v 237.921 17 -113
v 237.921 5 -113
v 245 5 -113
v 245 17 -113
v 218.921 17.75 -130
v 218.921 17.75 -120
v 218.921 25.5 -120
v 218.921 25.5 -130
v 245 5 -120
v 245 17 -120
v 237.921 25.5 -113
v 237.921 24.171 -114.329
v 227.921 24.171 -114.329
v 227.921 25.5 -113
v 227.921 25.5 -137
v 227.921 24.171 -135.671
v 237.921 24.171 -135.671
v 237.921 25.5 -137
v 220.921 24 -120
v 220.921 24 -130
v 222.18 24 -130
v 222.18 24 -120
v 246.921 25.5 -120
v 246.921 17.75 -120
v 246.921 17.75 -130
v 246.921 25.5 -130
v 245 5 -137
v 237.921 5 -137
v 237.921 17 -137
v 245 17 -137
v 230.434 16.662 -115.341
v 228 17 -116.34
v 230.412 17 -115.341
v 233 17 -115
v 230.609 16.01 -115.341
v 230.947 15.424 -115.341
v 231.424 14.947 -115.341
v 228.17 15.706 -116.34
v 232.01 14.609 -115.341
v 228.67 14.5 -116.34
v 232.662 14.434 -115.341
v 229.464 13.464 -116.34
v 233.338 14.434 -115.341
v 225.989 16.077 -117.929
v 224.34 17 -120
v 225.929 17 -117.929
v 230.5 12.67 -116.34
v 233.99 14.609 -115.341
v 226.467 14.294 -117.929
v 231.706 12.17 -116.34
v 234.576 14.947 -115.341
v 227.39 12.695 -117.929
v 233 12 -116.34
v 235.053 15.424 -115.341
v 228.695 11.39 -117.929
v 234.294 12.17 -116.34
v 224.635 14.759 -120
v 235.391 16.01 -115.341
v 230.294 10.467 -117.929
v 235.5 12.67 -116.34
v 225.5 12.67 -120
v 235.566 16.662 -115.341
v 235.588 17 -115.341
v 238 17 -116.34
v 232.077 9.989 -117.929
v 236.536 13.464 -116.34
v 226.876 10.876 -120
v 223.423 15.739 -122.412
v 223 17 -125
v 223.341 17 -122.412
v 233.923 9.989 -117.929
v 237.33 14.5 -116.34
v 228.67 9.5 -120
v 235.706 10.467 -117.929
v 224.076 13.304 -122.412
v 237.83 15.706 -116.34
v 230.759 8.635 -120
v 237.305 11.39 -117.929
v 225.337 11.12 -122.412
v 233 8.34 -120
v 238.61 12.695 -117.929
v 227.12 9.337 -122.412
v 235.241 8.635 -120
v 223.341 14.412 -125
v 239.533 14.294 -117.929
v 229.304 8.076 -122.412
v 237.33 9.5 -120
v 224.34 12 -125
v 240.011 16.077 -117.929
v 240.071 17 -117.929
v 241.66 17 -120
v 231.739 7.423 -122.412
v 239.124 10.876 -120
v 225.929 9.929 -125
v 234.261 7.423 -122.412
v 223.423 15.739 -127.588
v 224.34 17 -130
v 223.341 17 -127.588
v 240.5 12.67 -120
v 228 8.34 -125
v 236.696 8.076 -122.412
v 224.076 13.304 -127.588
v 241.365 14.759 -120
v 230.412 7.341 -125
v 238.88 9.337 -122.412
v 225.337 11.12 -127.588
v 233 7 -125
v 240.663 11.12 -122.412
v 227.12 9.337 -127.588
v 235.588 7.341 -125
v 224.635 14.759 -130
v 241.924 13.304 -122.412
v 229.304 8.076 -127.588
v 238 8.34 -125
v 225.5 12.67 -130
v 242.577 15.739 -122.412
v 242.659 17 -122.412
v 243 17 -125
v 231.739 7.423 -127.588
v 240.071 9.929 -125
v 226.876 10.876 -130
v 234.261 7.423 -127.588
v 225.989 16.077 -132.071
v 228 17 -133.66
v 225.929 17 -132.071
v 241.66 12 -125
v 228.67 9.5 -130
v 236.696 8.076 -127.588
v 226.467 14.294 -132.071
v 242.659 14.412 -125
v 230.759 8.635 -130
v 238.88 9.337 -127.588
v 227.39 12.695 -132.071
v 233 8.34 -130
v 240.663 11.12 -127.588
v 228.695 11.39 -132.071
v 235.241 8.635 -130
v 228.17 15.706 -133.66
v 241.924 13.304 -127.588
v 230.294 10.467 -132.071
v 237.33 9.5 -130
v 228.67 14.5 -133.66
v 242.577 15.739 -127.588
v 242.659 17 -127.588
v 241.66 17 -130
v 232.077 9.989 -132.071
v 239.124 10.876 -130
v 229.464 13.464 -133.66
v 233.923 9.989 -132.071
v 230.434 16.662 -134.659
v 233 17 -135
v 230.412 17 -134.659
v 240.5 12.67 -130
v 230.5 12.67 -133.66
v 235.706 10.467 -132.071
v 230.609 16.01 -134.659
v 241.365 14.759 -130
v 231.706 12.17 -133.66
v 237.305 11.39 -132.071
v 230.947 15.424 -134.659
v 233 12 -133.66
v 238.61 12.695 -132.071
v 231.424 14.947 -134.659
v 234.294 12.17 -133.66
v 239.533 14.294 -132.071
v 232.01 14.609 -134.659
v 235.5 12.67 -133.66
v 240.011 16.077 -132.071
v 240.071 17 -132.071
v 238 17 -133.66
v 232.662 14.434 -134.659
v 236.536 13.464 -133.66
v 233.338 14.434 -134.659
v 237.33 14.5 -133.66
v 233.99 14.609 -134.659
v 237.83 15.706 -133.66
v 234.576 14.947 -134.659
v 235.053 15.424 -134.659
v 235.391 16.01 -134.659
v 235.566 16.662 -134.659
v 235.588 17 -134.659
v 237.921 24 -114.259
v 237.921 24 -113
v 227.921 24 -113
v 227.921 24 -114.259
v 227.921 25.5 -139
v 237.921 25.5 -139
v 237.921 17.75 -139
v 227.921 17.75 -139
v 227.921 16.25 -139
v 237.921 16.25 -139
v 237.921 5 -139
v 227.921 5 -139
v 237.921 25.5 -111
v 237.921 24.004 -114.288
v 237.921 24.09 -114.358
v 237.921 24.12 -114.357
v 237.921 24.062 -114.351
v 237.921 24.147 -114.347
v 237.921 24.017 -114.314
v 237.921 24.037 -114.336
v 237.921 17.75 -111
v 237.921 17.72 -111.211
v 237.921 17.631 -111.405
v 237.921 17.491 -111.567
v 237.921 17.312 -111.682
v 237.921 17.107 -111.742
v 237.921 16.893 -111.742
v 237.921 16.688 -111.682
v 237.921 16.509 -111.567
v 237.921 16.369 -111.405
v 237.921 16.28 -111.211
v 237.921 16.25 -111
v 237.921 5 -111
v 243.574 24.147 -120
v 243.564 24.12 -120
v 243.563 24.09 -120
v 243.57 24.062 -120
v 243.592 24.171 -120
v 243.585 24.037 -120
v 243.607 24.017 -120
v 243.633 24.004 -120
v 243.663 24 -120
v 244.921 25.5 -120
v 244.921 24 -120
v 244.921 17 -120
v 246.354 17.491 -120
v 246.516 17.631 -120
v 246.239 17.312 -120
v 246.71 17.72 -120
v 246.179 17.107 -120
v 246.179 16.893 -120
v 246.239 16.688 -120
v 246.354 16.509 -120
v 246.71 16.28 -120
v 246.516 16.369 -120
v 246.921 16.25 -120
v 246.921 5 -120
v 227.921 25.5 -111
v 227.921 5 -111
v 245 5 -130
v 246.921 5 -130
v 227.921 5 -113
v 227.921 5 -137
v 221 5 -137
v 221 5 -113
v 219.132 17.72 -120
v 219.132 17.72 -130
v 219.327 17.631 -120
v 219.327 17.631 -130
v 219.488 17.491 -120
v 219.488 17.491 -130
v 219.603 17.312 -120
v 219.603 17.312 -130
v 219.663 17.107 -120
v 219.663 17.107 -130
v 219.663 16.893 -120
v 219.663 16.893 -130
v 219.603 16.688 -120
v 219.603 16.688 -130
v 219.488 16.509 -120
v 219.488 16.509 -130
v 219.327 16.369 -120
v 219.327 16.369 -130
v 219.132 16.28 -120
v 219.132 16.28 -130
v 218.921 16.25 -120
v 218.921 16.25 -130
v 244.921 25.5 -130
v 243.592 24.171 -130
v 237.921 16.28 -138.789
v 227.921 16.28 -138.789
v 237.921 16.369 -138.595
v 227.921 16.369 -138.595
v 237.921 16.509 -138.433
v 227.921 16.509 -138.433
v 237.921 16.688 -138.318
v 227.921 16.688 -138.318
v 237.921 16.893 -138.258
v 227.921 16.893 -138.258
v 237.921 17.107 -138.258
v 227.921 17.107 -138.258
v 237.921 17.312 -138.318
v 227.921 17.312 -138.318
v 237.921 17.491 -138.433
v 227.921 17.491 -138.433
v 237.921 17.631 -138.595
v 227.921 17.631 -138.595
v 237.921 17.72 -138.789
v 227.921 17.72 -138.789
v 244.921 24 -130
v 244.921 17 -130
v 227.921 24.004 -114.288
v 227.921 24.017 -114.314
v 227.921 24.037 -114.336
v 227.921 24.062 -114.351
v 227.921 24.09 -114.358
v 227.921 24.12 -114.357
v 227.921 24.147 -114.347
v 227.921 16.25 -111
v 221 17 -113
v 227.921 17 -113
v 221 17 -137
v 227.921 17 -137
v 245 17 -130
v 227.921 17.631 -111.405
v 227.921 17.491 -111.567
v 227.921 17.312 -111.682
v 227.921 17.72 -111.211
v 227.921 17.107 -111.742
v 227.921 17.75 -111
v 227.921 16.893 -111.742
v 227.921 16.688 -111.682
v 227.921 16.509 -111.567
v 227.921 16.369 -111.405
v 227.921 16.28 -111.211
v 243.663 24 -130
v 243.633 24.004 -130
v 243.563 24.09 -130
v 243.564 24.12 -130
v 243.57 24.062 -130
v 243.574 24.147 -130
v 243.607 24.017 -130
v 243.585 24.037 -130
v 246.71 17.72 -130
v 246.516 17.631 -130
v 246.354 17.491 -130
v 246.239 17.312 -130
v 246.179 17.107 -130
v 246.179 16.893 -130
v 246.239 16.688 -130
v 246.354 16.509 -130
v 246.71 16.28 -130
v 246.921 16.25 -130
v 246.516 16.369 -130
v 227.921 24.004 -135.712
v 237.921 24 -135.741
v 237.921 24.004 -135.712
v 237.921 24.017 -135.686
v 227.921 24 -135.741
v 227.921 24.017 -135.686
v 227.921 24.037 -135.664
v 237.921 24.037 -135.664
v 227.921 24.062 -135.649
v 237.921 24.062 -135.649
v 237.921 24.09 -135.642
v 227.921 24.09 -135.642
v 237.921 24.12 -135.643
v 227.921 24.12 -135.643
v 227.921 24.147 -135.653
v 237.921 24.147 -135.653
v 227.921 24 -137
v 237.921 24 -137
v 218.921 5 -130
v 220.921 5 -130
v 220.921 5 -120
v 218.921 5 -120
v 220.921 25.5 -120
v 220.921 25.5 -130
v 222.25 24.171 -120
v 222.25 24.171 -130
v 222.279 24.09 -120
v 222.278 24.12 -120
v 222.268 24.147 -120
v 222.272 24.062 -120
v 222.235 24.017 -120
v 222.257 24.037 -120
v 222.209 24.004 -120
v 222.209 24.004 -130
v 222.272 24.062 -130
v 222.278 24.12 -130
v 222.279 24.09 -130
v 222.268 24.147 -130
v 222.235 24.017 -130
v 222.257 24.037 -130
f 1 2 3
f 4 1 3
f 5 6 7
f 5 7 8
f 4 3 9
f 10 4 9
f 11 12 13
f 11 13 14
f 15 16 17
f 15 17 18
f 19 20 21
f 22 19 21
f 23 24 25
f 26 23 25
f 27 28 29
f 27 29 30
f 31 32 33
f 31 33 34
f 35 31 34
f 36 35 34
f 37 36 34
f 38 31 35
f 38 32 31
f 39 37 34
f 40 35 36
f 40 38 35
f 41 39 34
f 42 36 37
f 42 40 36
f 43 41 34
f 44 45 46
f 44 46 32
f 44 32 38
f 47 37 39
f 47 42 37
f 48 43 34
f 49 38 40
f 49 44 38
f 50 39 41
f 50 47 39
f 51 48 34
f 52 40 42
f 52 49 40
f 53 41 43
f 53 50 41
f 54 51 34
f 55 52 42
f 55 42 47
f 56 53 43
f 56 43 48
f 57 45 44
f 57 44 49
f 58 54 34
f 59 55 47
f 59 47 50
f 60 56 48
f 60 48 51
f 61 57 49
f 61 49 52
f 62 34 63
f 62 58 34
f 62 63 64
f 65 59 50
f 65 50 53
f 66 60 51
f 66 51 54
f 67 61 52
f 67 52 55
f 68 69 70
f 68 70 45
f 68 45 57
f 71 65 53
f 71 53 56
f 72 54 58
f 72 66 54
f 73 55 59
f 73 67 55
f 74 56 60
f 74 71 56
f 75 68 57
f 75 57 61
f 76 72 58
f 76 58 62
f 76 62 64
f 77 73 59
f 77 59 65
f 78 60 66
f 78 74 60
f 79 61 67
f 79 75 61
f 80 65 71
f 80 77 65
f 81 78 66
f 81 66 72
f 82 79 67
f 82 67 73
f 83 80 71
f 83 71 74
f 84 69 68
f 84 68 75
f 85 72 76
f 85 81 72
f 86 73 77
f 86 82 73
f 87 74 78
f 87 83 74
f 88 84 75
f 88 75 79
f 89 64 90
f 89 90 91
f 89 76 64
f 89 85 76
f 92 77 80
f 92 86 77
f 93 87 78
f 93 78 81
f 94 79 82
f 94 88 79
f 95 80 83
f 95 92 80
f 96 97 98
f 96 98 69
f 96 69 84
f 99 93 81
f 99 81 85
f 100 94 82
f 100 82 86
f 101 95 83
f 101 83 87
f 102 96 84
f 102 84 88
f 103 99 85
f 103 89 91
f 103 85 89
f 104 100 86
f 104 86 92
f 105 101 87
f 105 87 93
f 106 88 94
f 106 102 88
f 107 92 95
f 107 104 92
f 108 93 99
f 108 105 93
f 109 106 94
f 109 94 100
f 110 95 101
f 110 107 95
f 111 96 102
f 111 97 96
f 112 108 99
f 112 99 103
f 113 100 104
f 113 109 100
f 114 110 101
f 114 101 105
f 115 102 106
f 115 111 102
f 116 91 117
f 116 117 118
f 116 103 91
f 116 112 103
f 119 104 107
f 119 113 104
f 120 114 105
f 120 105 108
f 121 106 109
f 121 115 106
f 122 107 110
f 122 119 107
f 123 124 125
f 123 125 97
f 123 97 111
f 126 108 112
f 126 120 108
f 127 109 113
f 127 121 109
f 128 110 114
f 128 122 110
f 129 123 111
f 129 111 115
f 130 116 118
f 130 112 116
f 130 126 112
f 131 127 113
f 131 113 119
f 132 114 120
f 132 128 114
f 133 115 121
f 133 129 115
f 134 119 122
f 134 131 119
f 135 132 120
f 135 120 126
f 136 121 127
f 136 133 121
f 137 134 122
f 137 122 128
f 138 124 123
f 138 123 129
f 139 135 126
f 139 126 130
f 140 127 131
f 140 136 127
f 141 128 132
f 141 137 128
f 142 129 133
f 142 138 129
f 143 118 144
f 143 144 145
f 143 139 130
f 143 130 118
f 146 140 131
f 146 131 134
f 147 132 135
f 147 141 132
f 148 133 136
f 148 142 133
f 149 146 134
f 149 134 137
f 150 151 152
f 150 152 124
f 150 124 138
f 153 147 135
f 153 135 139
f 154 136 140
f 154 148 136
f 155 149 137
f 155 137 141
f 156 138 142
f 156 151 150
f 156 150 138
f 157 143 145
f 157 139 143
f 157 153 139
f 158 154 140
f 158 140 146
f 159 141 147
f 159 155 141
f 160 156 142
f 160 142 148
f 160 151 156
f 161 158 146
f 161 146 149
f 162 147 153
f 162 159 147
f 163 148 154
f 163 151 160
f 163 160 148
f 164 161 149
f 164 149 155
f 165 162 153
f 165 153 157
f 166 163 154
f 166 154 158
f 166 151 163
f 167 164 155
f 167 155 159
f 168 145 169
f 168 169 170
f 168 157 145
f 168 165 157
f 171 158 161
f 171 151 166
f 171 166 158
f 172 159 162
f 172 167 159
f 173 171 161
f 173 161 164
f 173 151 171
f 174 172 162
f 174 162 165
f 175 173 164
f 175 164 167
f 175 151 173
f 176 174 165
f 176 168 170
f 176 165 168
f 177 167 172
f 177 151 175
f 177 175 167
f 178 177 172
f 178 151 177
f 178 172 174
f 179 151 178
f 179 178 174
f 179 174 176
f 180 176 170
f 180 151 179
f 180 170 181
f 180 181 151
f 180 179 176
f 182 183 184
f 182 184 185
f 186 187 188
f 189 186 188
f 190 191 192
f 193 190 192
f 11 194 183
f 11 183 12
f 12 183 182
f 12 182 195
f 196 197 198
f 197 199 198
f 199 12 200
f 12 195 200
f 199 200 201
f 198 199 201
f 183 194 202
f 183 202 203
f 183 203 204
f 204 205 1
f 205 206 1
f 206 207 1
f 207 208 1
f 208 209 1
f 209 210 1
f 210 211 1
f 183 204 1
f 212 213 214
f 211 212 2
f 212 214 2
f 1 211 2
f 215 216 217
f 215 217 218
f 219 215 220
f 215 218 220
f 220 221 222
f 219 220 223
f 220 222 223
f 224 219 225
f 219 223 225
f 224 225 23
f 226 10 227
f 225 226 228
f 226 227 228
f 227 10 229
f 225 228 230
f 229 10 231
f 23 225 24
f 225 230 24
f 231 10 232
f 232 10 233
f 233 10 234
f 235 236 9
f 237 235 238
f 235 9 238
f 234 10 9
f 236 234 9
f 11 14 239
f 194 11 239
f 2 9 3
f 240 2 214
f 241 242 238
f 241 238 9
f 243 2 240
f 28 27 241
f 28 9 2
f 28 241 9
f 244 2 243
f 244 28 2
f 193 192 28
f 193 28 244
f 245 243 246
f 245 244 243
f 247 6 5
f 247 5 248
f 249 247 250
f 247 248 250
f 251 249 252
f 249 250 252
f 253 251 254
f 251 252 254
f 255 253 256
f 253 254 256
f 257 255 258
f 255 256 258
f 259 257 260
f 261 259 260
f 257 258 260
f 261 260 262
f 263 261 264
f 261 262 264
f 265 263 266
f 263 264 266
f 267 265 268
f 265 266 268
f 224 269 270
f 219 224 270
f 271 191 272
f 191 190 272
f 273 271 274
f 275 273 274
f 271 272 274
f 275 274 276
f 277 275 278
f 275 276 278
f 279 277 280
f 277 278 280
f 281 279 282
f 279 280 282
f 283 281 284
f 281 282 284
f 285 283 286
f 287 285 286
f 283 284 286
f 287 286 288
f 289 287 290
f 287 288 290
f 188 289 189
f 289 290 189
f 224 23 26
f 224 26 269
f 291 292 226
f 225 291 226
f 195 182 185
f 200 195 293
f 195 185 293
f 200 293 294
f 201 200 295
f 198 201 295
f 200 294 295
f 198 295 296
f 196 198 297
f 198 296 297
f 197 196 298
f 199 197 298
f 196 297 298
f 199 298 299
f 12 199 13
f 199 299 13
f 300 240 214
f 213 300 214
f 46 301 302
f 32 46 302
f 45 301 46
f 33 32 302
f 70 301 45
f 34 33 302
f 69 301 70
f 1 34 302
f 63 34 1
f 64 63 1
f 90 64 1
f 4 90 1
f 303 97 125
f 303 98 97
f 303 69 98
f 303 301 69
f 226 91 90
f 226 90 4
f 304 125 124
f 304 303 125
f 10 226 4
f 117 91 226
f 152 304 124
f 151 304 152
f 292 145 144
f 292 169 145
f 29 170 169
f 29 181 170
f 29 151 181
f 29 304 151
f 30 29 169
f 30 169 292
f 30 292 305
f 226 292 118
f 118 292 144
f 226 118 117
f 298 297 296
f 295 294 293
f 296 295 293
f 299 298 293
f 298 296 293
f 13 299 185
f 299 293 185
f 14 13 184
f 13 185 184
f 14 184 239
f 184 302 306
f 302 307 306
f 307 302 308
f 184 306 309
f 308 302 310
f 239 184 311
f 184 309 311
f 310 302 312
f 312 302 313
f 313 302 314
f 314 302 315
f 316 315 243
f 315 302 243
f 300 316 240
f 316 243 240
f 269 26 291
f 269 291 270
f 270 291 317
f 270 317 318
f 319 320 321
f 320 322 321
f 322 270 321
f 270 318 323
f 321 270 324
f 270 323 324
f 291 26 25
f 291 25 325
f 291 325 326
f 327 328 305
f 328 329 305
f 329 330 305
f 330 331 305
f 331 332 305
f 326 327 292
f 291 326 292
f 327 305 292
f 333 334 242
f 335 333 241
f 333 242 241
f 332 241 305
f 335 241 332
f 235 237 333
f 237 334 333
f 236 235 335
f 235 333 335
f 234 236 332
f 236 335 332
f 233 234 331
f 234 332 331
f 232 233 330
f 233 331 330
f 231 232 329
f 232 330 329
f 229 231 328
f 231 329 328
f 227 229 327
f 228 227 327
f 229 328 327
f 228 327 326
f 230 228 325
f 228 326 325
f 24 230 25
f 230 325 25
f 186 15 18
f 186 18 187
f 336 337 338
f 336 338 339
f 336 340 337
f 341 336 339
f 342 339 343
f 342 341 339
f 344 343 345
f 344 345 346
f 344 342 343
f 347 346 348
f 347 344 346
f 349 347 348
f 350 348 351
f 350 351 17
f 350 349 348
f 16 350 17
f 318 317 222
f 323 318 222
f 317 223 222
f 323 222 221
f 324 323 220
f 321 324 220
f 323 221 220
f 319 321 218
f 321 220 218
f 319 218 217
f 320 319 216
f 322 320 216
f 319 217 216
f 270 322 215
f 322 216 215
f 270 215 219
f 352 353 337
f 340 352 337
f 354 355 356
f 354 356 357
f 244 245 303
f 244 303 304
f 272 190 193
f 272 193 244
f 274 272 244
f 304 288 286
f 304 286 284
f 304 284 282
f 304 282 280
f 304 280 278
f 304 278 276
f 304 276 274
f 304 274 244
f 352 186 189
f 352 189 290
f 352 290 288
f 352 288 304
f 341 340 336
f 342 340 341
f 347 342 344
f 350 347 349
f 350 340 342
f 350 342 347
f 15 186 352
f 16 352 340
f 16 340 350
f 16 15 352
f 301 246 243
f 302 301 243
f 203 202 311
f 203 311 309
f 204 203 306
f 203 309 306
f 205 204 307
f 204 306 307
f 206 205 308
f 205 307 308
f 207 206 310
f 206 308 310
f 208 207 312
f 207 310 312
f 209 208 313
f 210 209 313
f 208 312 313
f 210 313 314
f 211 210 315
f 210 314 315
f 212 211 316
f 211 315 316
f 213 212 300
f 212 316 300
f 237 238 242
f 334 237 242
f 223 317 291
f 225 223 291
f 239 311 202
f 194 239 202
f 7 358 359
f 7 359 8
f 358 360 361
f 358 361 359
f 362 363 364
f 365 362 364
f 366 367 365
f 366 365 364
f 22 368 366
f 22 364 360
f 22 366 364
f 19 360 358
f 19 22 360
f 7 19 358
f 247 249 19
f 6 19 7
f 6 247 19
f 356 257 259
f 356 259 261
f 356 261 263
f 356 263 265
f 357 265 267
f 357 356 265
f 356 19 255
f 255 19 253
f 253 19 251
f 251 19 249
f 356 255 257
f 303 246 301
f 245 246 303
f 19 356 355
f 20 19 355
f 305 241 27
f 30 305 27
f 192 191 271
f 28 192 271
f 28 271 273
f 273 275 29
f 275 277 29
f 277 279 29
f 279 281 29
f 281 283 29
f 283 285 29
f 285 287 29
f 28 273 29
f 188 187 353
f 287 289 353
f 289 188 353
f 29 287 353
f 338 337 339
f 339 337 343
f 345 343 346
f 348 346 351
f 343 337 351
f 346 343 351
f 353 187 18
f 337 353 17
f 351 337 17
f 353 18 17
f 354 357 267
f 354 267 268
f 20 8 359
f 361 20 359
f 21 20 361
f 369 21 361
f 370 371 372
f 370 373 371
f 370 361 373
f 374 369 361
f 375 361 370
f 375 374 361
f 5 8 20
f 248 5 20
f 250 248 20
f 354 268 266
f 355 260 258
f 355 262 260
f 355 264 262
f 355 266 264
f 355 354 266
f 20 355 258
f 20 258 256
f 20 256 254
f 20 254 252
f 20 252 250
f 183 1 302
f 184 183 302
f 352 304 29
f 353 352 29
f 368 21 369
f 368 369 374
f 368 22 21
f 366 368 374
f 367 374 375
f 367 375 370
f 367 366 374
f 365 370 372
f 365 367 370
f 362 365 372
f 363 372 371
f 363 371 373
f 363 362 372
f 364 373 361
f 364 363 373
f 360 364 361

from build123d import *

# Parameters (mm, degrees)
SKETCH1_W               = 250
SKETCH1_H               = 250
BOSS_EXTRUDE1_DEPTH     = 5
SKETCH2_W               = 24
SKETCH2_H               = 24
BOSS_EXTRUDE2_DEPTH     = 12
BOSS_EXTRUDE3_DEPTH     = 19
BOSS_EXTRUDE5_DEPTH     = 10
BOSS_EXTRUDE6_DEPTH     = 10
BOSS_EXTRUDE7_DEPTH     = 10
BOSS_EXTRUDE8_DEPTH     = 10
SKETCH12_R              = 0.75
CUT_EXTRUDE1_DEPTH      = 347.058798176
SKETCH13_R              = 0.75
CUT_EXTRUDE2_DEPTH      = 283.931528819
SKETCH14_R              = 0.75
CUT_EXTRUDE3_DEPTH      = 283.931528819
SKETCH15_R              = 0.75
CUT_EXTRUDE4_DEPTH      = 283.931528819
FILLET1_R               = 0.1
CUT_EXTRUDE5_DEPTH      = 2.3
CUT_EXTRUDE6_DEPTH      = 355.313759259
BOSS_EXTRUDE9_START     = -150
BOSS_EXTRUDE9_DEPTH     = 80
BOSS_EXTRUDE10_START    = 20
BOSS_EXTRUDE10_DEPTH    = 40
BOSS_EXTRUDE11_DEPTH    = 6
SKETCH22_W              = 22.6
SKETCH22_H              = 27
BOSS_EXTRUDE12_DEPTH    = 2
CUT_EXTRUDE7_START      = -4
SKETCH23_W              = 3
SKETCH23_H              = 8
CUT_EXTRUDE7_DEPTH      = 4
CUT_EXTRUDE8_DEPTH      = 6
BOSS_EXTRUDE13_START    = 5
BOSS_EXTRUDE13_DEPTH    = 3
BOSS_EXTRUDE14_START    = 5
BOSS_EXTRUDE14_DEPTH    = 3
CUT_EXTRUDE9_DEPTH      = 355.147215152
CUT_EXTRUDE9_DEPTH_BACK = 355.147215152
SKETCH29_W              = 55.476863103
SKETCH29_H              = 5
CUT_EXTRUDE10_DEPTH     = 257.874477746


with BuildPart() as part:
    # Sketch1 → Boss-Extrude1 (new body)
    with BuildSketch(Plane(origin=(0, 0, 0), x_dir=(1, 0, 0), z_dir=(0, 1, 0))):
        with Locations((125, 125)):
            Rectangle(SKETCH1_W, SKETCH1_H)
    extrude(amount=BOSS_EXTRUDE1_DEPTH)

    # Sketch2 → Boss-Extrude2 (add)
    with BuildSketch(Plane(origin=(0, 5, 0), x_dir=(1, 0, 0), z_dir=(0, 1, 0))):
        with Locations((125, 125)):
            Rectangle(SKETCH2_W, SKETCH2_H)
        with Locations((233, 125)):
            Rectangle(SKETCH2_W, SKETCH2_H)
        with Locations((125, 17.078916875)):
            Rectangle(SKETCH2_W, SKETCH2_H)
    extrude(amount=BOSS_EXTRUDE2_DEPTH)

    # Sketch4 → Cut-Revolve1 (revolve, cut)
    with BuildSketch(Plane(origin=(0, 17, 0), x_dir=(1, 0, 0), z_dir=(0, 1, 0))):
        with BuildLine():
            Line((125, 115), (125, 135))
            ThreePointArc((125, 135), (115, 125), (125, 115))
        make_face()
    revolve(axis=Axis((125, 17, -135), (0, 0, 1)), mode=Mode.SUBTRACT)

    # Sketch4<3> → Cut-Revolve2 (revolve, cut)
    with BuildSketch(Plane(origin=(0, 17, 0), x_dir=(1, 0, 0), z_dir=(0, 1, 0))):
        with BuildLine():
            Line((233, 135), (233, 115))
            ThreePointArc((233, 115), (243, 125), (233, 135))
        make_face()
    revolve(axis=Axis((233, 17, -135), (0, 0, 1)), mode=Mode.SUBTRACT)

    # Sketch4<4> → Cut-Revolve3 (revolve, cut)
    with BuildSketch(Plane(origin=(0, 17, 0), x_dir=(1, 0, 0), z_dir=(0, 1, 0))):
        with BuildLine():
            Line((125, 7), (125, 27))
            ThreePointArc((125, 27), (115, 17), (125, 7))
        make_face()
    revolve(axis=Axis((125, 17, -7), (0, 0, -1)), mode=Mode.SUBTRACT)

    # Sketch5 → Boss-Extrude3 (add)
    with BuildSketch(Plane(origin=(0, 5, 0), x_dir=(1, 0, 0), z_dir=(0, 1, 0))):
        Polygon((125, 137), (130, 137), (130, 139), (120, 139), (120, 137), align=None)
        Polygon((120, 113), (125, 113), (130, 113), (130, 111), (120, 111), align=None)
        Polygon((125, 29.078916875), (130, 29.078916875), (130, 31.078916875), (120, 31.078916875), (120, 29.078916875), align=None)
        Polygon((120, 5.078916875), (125, 5.078916875), (130, 5.078916875), (130, 3.078916875), (120, 3.078916875), align=None)
        Polygon((113, 130), (113, 125), (113, 120), (111, 120), (111, 130), align=None)
        Polygon((137, 125), (137, 120), (139, 120), (139, 130), (137, 130), align=None)
        Polygon((220.921083125, 130), (220.921083125, 125), (220.921083125, 120), (218.921083125, 120), (218.921083125, 130), align=None)
        Polygon((244.921083125, 125), (244.921083125, 120), (246.921083125, 120), (246.921083125, 130), (244.921083125, 130), align=None)
        Polygon((137, 12.078916875), (137, 17.078916875), (137, 22.078916875), (139, 22.078916875), (139, 12.078916875), align=None)
        Polygon((113, 17.078916875), (113, 22.078916875), (111, 22.078916875), (111, 12.078916875), (113, 12.078916875), align=None)
        Polygon((237.921083125, 137), (232.921083125, 137), (227.921083125, 137), (227.921083125, 139), (237.921083125, 139), align=None)
        Polygon((232.921083125, 113), (227.921083125, 113), (227.921083125, 111), (237.921083125, 111), (237.921083125, 113), align=None)
    extrude(amount=BOSS_EXTRUDE3_DEPTH)

    # Sketch8 → Boss-Extrude5 (add)
    with BuildSketch(Plane.ZY.offset(-120)):
        Polygon((-3.078916875, 24), (-6.578916875, 24), (-5.078916875, 25.5), (-3.078916875, 25.5), align=None)
        Polygon((-29.078916875, 25.5), (-27.578916875, 24), (-31.078916875, 24), (-31.078916875, 25.5), align=None)
        Polygon((-111, 24), (-114.5, 24), (-113, 25.5), (-111, 25.5), align=None)
        Polygon((-137, 25.5), (-135.5, 24), (-139, 24), (-139, 25.5), align=None)
    extrude(amount=-BOSS_EXTRUDE5_DEPTH)

    # Sketch9 → Boss-Extrude6 (add)
    with BuildSketch(Plane(origin=(0, 0, -130), x_dir=(-1, 0, 0), z_dir=(0, 0, -1))):
        Polygon((-111, 24), (-114.5, 24), (-113, 25.5), (-111, 25.5), align=None)
        Polygon((-137, 25.5), (-135.5, 24), (-139, 24), (-139, 25.5), align=None)
        Polygon((-218.921083125, 24), (-222.421083125, 24), (-220.921083125, 25.5), (-218.921083125, 25.5), align=None)
        Polygon((-244.921083125, 25.5), (-243.421083125, 24), (-246.921083125, 24), (-246.921083125, 25.5), align=None)
    extrude(amount=-BOSS_EXTRUDE6_DEPTH)

    # Sketch10 → Boss-Extrude7 (add)
    with BuildSketch(Plane(origin=(237.921083125, 0, 0), x_dir=(0, 0, -1), z_dir=(1, 0, 0))):
        Polygon((139, 24), (135.5, 24), (137, 25.5), (139, 25.5), align=None)
        Polygon((111, 25.5), (111, 24), (114.5, 24), (113, 25.5), align=None)
    extrude(amount=-BOSS_EXTRUDE7_DEPTH)

    # Sketch11 → Boss-Extrude8 (add)
    with BuildSketch(Plane.XY.offset(-12.078916875)):
        Polygon((139, 24), (135.5, 24), (137, 25.5), (139, 25.5), align=None)
        Polygon((111, 25.5), (111, 24), (114.5, 24), (113, 25.5), align=None)
    extrude(amount=-BOSS_EXTRUDE8_DEPTH)

    # Sketch12 → Cut-Extrude1 (cut, through all)
    with BuildSketch(Plane.XY.offset(-12.078916875)):
        with Locations((139, 17)):
            Circle(SKETCH12_R)
        with Locations((111, 17)):
            Circle(SKETCH12_R)
    extrude(amount=-CUT_EXTRUDE1_DEPTH, mode=Mode.SUBTRACT)

    # Sketch13 → Cut-Extrude2 (cut, through all)
    with BuildSketch(Plane.ZY.offset(-120)):
        with Locations((-111, 17)):
            Circle(SKETCH13_R)
        with Locations((-139, 17)):
            Circle(SKETCH13_R)
    extrude(amount=-CUT_EXTRUDE2_DEPTH, mode=Mode.SUBTRACT)

    # Sketch14 → Cut-Extrude3 (cut, through all)
    with BuildSketch(Plane(origin=(0, 0, -130), x_dir=(-1, 0, 0), z_dir=(0, 0, -1))):
        with Locations((-218.921083125, 17)):
            Circle(SKETCH14_R)
        with Locations((-246.921083125, 17)):
            Circle(SKETCH14_R)
    extrude(amount=-CUT_EXTRUDE3_DEPTH, mode=Mode.SUBTRACT)

    # Sketch15 → Cut-Extrude4 (cut, through all)
    with BuildSketch(Plane(origin=(130, 0, 0), x_dir=(0, 0, -1), z_dir=(1, 0, 0))):
        with Locations((31.078916875, 17)):
            Circle(SKETCH15_R)
        with Locations((3.078916875, 17)):
            Circle(SKETCH15_R)
    extrude(amount=-CUT_EXTRUDE4_DEPTH, mode=Mode.SUBTRACT)

    # Fillet1
    fillet1_edges = [part.edges().sort_by_distance(p)[0] for p in [
        (232.921083125, 24, -135.5),
        (243.421083125, 24, -125),
        (232.921083125, 24, -114.5),
        (222.421083125, 24, -125),
        (114.5, 24, -125),
        (125, 24, -135.5),
        (125, 24, -114.5),
        (135.5, 24, -125),
        (135.5, 24, -17.078916875),
        (125, 24, -6.578916875),
        (114.5, 24, -17.078916875),
        (125, 24, -27.578916875),
    ]]
    fillet(fillet1_edges, radius=FILLET1_R)

    # Sketch17 → Cut-Extrude5 (cut)
    with BuildSketch(Plane.XZ):
        with BuildLine():
            Line((125.35, -232.7), (124.65, -232.7))
            ThreePointArc((124.65, -232.7), (122.35, -235), (124.65, -237.3))
            Line((124.65, -237.3), (125, -237.3))
            Line((125, -237.3), (125.35, -237.3))
            ThreePointArc((125.35, -237.3), (127.65, -235), (125.35, -232.7))
        make_face()
        with BuildLine():
            ThreePointArc((12.7, -125.35), (15, -127.65), (17.3, -125.35))
            Line((17.3, -125.35), (17.3, -124.65))
            ThreePointArc((17.3, -124.65), (15, -122.35), (12.7, -124.65))
            Line((12.7, -124.65), (12.7, -125.35))
        make_face()
    extrude(amount=-CUT_EXTRUDE5_DEPTH, mode=Mode.SUBTRACT)

    # Sketch18 → Cut-Extrude6 (cut, through all)
    with BuildSketch(Plane.XZ.offset(-2.3)):
        with BuildLine():
            Line((12.843614135, -123.85), (17.156385865, -123.85))
            ThreePointArc((17.156385865, -123.85), (15, -122.35), (12.843614135, -123.85))
        make_face()
        with BuildLine():
            ThreePointArc((12.843614135, -126.15), (15, -127.65), (17.156385865, -126.15))
            Line((17.156385865, -126.15), (12.843614135, -126.15))
        make_face()
        with BuildLine():
            Line((123.85, -237.156385865), (123.85, -232.843614135))
            ThreePointArc((123.85, -232.843614135), (122.35, -235), (123.85, -237.156385865))
        make_face()
        with BuildLine():
            ThreePointArc((126.15, -237.156385865), (127.65, -235), (126.15, -232.843614135))
            Line((126.15, -232.843614135), (126.15, -237.156385865))
        make_face()
    extrude(amount=-CUT_EXTRUDE6_DEPTH, mode=Mode.SUBTRACT)

    # Sketch19 → Boss-Extrude9 (add)
    with BuildSketch(Plane.XY.offset(BOSS_EXTRUDE9_START)):
        with BuildLine():
            Line((120, 5), (121, 5))
            ThreePointArc((121, 5), (125, 9), (129, 5))
            Line((129, 5), (130, 5))
            ThreePointArc((130, 5), (125, 10), (120, 5))
        make_face()
    extrude(amount=-BOSS_EXTRUDE9_DEPTH)

    # Sketch20 → Boss-Extrude10 (add)
    with BuildSketch(Plane(origin=(0, 0, 0), x_dir=(0, 0, -1), z_dir=(1, 0, 0)).offset(BOSS_EXTRUDE10_START)):
        with BuildLine():
            Line((120, 5), (121, 5))
            ThreePointArc((121, 5), (125, 9), (129, 5))
            Line((129, 5), (130, 5))
            ThreePointArc((130, 5), (125, 10), (120, 5))
        make_face()
    extrude(amount=BOSS_EXTRUDE10_DEPTH)

    # Sketch21 → Boss-Extrude11 (add)
    with BuildSketch(Plane(origin=(0, 5, 0), x_dir=(1, 0, 0), z_dir=(0, 1, 0))):
        Polygon((85.204623334, 138.5), (65.604623334, 138.5), (65.604623334, 111.5), (85.204623334, 111.5), (88.204623334, 111.5), (88.204623334, 122.5), (85.204623334, 122.5), (85.204623334, 114.5), (68.604623334, 114.5), (68.604623334, 135.5), (85.204623334, 135.5), align=None)
    extrude(amount=BOSS_EXTRUDE11_DEPTH)

    # Sketch22 → Boss-Extrude12 (add)
    with BuildSketch(Plane(origin=(0, 11, 0), x_dir=(1, 0, 0), z_dir=(0, 1, 0))):
        with Locations((76.904623334, 125)):
            Rectangle(SKETCH22_W, SKETCH22_H)
    extrude(amount=BOSS_EXTRUDE12_DEPTH)

    # Sketch23 → Cut-Extrude7 (cut)
    with BuildSketch(Plane(origin=(0, 13, 0), x_dir=(1, 0, 0), z_dir=(0, 1, 0)).offset(CUT_EXTRUDE7_START)):
        with Locations((86.704623334, 118.5)):
            Rectangle(SKETCH23_W, SKETCH23_H)
    extrude(amount=-CUT_EXTRUDE7_DEPTH, mode=Mode.SUBTRACT)

    # Sketch24 → Cut-Extrude8 (cut)
    with BuildSketch(Plane.ZY.offset(-65.604623334)):
        with BuildLine():
            Line((-127, 5), (-123, 5))
            ThreePointArc((-123, 5), (-125, 7), (-127, 5))
        make_face()
    extrude(amount=-CUT_EXTRUDE8_DEPTH, mode=Mode.SUBTRACT)

    # Sketch26 → Boss-Extrude13 (add)
    with BuildSketch(Plane(origin=(0, 5, 0), x_dir=(1, 0, 0), z_dir=(0, 1, 0)).offset(BOSS_EXTRUDE13_START)):
        with BuildLine():
            Line((111, 130), (111, 128))
            ThreePointArc((111, 128), (108, 125), (111, 122))
            Line((111, 122), (111, 120))
            ThreePointArc((111, 120), (106, 125), (111, 130))
        make_face()
    extrude(amount=BOSS_EXTRUDE13_DEPTH)

    # Sketch27 → Boss-Extrude14 (add)
    with BuildSketch(Plane(origin=(0, 5, 0), x_dir=(1, 0, 0), z_dir=(0, 1, 0)).offset(BOSS_EXTRUDE14_START)):
        with BuildLine():
            Line((120, 139), (122, 139))
            ThreePointArc((122, 139), (125, 142), (128, 139))
            Line((128, 139), (130, 139))
            ThreePointArc((130, 139), (125, 144), (120, 139))
        make_face()
    extrude(amount=BOSS_EXTRUDE14_DEPTH)

    # Sketch28 → Cut-Extrude9 (cut, two sides: drawn at the far end of the back side and taken through both)
    with BuildSketch(Plane(origin=(0, 5, 0), x_dir=(1, 0, 0), z_dir=(0, 1, 0)).offset(-CUT_EXTRUDE9_DEPTH_BACK)):
        Polygon((250, 0), (250, 96.237969813), (194.523136897, 96.237969813), (194.523136897, 149.475619246), (250, 149.475619246), (250, 250), (0, 250), (0, 0), align=None)
    extrude(amount=CUT_EXTRUDE9_DEPTH + CUT_EXTRUDE9_DEPTH_BACK, mode=Mode.SUBTRACT)

    # Sketch29 → Cut-Extrude10 (cut, through all)
    with BuildSketch(Plane(origin=(0, 0, -149.475619246), x_dir=(-1, 0, 0), z_dir=(0, 0, -1))):
        with Locations((-222.261568449, 2.5)):
            Rectangle(SKETCH29_W, SKETCH29_H)
    extrude(amount=-CUT_EXTRUDE10_DEPTH, mode=Mode.SUBTRACT)


with BuildPart() as cut_extrude10_piece_1:
    # of the separate pieces the step leaves, piece 1, a body of its own (cut_extrude10_pieces)
    add(part.part.solids().sort_by_distance((237.921083125, 24, -114.258578644))[0])


with BuildPart() as cut_extrude10_piece_2:
    # of the separate pieces the step leaves, piece 2, a body of its own (cut_extrude10_pieces)
    add(part.part.solids().sort_by_distance((220.921083125, 5, -130))[0])


solid = Compound([cut_extrude10_piece_1.part, cut_extrude10_piece_2.part])
